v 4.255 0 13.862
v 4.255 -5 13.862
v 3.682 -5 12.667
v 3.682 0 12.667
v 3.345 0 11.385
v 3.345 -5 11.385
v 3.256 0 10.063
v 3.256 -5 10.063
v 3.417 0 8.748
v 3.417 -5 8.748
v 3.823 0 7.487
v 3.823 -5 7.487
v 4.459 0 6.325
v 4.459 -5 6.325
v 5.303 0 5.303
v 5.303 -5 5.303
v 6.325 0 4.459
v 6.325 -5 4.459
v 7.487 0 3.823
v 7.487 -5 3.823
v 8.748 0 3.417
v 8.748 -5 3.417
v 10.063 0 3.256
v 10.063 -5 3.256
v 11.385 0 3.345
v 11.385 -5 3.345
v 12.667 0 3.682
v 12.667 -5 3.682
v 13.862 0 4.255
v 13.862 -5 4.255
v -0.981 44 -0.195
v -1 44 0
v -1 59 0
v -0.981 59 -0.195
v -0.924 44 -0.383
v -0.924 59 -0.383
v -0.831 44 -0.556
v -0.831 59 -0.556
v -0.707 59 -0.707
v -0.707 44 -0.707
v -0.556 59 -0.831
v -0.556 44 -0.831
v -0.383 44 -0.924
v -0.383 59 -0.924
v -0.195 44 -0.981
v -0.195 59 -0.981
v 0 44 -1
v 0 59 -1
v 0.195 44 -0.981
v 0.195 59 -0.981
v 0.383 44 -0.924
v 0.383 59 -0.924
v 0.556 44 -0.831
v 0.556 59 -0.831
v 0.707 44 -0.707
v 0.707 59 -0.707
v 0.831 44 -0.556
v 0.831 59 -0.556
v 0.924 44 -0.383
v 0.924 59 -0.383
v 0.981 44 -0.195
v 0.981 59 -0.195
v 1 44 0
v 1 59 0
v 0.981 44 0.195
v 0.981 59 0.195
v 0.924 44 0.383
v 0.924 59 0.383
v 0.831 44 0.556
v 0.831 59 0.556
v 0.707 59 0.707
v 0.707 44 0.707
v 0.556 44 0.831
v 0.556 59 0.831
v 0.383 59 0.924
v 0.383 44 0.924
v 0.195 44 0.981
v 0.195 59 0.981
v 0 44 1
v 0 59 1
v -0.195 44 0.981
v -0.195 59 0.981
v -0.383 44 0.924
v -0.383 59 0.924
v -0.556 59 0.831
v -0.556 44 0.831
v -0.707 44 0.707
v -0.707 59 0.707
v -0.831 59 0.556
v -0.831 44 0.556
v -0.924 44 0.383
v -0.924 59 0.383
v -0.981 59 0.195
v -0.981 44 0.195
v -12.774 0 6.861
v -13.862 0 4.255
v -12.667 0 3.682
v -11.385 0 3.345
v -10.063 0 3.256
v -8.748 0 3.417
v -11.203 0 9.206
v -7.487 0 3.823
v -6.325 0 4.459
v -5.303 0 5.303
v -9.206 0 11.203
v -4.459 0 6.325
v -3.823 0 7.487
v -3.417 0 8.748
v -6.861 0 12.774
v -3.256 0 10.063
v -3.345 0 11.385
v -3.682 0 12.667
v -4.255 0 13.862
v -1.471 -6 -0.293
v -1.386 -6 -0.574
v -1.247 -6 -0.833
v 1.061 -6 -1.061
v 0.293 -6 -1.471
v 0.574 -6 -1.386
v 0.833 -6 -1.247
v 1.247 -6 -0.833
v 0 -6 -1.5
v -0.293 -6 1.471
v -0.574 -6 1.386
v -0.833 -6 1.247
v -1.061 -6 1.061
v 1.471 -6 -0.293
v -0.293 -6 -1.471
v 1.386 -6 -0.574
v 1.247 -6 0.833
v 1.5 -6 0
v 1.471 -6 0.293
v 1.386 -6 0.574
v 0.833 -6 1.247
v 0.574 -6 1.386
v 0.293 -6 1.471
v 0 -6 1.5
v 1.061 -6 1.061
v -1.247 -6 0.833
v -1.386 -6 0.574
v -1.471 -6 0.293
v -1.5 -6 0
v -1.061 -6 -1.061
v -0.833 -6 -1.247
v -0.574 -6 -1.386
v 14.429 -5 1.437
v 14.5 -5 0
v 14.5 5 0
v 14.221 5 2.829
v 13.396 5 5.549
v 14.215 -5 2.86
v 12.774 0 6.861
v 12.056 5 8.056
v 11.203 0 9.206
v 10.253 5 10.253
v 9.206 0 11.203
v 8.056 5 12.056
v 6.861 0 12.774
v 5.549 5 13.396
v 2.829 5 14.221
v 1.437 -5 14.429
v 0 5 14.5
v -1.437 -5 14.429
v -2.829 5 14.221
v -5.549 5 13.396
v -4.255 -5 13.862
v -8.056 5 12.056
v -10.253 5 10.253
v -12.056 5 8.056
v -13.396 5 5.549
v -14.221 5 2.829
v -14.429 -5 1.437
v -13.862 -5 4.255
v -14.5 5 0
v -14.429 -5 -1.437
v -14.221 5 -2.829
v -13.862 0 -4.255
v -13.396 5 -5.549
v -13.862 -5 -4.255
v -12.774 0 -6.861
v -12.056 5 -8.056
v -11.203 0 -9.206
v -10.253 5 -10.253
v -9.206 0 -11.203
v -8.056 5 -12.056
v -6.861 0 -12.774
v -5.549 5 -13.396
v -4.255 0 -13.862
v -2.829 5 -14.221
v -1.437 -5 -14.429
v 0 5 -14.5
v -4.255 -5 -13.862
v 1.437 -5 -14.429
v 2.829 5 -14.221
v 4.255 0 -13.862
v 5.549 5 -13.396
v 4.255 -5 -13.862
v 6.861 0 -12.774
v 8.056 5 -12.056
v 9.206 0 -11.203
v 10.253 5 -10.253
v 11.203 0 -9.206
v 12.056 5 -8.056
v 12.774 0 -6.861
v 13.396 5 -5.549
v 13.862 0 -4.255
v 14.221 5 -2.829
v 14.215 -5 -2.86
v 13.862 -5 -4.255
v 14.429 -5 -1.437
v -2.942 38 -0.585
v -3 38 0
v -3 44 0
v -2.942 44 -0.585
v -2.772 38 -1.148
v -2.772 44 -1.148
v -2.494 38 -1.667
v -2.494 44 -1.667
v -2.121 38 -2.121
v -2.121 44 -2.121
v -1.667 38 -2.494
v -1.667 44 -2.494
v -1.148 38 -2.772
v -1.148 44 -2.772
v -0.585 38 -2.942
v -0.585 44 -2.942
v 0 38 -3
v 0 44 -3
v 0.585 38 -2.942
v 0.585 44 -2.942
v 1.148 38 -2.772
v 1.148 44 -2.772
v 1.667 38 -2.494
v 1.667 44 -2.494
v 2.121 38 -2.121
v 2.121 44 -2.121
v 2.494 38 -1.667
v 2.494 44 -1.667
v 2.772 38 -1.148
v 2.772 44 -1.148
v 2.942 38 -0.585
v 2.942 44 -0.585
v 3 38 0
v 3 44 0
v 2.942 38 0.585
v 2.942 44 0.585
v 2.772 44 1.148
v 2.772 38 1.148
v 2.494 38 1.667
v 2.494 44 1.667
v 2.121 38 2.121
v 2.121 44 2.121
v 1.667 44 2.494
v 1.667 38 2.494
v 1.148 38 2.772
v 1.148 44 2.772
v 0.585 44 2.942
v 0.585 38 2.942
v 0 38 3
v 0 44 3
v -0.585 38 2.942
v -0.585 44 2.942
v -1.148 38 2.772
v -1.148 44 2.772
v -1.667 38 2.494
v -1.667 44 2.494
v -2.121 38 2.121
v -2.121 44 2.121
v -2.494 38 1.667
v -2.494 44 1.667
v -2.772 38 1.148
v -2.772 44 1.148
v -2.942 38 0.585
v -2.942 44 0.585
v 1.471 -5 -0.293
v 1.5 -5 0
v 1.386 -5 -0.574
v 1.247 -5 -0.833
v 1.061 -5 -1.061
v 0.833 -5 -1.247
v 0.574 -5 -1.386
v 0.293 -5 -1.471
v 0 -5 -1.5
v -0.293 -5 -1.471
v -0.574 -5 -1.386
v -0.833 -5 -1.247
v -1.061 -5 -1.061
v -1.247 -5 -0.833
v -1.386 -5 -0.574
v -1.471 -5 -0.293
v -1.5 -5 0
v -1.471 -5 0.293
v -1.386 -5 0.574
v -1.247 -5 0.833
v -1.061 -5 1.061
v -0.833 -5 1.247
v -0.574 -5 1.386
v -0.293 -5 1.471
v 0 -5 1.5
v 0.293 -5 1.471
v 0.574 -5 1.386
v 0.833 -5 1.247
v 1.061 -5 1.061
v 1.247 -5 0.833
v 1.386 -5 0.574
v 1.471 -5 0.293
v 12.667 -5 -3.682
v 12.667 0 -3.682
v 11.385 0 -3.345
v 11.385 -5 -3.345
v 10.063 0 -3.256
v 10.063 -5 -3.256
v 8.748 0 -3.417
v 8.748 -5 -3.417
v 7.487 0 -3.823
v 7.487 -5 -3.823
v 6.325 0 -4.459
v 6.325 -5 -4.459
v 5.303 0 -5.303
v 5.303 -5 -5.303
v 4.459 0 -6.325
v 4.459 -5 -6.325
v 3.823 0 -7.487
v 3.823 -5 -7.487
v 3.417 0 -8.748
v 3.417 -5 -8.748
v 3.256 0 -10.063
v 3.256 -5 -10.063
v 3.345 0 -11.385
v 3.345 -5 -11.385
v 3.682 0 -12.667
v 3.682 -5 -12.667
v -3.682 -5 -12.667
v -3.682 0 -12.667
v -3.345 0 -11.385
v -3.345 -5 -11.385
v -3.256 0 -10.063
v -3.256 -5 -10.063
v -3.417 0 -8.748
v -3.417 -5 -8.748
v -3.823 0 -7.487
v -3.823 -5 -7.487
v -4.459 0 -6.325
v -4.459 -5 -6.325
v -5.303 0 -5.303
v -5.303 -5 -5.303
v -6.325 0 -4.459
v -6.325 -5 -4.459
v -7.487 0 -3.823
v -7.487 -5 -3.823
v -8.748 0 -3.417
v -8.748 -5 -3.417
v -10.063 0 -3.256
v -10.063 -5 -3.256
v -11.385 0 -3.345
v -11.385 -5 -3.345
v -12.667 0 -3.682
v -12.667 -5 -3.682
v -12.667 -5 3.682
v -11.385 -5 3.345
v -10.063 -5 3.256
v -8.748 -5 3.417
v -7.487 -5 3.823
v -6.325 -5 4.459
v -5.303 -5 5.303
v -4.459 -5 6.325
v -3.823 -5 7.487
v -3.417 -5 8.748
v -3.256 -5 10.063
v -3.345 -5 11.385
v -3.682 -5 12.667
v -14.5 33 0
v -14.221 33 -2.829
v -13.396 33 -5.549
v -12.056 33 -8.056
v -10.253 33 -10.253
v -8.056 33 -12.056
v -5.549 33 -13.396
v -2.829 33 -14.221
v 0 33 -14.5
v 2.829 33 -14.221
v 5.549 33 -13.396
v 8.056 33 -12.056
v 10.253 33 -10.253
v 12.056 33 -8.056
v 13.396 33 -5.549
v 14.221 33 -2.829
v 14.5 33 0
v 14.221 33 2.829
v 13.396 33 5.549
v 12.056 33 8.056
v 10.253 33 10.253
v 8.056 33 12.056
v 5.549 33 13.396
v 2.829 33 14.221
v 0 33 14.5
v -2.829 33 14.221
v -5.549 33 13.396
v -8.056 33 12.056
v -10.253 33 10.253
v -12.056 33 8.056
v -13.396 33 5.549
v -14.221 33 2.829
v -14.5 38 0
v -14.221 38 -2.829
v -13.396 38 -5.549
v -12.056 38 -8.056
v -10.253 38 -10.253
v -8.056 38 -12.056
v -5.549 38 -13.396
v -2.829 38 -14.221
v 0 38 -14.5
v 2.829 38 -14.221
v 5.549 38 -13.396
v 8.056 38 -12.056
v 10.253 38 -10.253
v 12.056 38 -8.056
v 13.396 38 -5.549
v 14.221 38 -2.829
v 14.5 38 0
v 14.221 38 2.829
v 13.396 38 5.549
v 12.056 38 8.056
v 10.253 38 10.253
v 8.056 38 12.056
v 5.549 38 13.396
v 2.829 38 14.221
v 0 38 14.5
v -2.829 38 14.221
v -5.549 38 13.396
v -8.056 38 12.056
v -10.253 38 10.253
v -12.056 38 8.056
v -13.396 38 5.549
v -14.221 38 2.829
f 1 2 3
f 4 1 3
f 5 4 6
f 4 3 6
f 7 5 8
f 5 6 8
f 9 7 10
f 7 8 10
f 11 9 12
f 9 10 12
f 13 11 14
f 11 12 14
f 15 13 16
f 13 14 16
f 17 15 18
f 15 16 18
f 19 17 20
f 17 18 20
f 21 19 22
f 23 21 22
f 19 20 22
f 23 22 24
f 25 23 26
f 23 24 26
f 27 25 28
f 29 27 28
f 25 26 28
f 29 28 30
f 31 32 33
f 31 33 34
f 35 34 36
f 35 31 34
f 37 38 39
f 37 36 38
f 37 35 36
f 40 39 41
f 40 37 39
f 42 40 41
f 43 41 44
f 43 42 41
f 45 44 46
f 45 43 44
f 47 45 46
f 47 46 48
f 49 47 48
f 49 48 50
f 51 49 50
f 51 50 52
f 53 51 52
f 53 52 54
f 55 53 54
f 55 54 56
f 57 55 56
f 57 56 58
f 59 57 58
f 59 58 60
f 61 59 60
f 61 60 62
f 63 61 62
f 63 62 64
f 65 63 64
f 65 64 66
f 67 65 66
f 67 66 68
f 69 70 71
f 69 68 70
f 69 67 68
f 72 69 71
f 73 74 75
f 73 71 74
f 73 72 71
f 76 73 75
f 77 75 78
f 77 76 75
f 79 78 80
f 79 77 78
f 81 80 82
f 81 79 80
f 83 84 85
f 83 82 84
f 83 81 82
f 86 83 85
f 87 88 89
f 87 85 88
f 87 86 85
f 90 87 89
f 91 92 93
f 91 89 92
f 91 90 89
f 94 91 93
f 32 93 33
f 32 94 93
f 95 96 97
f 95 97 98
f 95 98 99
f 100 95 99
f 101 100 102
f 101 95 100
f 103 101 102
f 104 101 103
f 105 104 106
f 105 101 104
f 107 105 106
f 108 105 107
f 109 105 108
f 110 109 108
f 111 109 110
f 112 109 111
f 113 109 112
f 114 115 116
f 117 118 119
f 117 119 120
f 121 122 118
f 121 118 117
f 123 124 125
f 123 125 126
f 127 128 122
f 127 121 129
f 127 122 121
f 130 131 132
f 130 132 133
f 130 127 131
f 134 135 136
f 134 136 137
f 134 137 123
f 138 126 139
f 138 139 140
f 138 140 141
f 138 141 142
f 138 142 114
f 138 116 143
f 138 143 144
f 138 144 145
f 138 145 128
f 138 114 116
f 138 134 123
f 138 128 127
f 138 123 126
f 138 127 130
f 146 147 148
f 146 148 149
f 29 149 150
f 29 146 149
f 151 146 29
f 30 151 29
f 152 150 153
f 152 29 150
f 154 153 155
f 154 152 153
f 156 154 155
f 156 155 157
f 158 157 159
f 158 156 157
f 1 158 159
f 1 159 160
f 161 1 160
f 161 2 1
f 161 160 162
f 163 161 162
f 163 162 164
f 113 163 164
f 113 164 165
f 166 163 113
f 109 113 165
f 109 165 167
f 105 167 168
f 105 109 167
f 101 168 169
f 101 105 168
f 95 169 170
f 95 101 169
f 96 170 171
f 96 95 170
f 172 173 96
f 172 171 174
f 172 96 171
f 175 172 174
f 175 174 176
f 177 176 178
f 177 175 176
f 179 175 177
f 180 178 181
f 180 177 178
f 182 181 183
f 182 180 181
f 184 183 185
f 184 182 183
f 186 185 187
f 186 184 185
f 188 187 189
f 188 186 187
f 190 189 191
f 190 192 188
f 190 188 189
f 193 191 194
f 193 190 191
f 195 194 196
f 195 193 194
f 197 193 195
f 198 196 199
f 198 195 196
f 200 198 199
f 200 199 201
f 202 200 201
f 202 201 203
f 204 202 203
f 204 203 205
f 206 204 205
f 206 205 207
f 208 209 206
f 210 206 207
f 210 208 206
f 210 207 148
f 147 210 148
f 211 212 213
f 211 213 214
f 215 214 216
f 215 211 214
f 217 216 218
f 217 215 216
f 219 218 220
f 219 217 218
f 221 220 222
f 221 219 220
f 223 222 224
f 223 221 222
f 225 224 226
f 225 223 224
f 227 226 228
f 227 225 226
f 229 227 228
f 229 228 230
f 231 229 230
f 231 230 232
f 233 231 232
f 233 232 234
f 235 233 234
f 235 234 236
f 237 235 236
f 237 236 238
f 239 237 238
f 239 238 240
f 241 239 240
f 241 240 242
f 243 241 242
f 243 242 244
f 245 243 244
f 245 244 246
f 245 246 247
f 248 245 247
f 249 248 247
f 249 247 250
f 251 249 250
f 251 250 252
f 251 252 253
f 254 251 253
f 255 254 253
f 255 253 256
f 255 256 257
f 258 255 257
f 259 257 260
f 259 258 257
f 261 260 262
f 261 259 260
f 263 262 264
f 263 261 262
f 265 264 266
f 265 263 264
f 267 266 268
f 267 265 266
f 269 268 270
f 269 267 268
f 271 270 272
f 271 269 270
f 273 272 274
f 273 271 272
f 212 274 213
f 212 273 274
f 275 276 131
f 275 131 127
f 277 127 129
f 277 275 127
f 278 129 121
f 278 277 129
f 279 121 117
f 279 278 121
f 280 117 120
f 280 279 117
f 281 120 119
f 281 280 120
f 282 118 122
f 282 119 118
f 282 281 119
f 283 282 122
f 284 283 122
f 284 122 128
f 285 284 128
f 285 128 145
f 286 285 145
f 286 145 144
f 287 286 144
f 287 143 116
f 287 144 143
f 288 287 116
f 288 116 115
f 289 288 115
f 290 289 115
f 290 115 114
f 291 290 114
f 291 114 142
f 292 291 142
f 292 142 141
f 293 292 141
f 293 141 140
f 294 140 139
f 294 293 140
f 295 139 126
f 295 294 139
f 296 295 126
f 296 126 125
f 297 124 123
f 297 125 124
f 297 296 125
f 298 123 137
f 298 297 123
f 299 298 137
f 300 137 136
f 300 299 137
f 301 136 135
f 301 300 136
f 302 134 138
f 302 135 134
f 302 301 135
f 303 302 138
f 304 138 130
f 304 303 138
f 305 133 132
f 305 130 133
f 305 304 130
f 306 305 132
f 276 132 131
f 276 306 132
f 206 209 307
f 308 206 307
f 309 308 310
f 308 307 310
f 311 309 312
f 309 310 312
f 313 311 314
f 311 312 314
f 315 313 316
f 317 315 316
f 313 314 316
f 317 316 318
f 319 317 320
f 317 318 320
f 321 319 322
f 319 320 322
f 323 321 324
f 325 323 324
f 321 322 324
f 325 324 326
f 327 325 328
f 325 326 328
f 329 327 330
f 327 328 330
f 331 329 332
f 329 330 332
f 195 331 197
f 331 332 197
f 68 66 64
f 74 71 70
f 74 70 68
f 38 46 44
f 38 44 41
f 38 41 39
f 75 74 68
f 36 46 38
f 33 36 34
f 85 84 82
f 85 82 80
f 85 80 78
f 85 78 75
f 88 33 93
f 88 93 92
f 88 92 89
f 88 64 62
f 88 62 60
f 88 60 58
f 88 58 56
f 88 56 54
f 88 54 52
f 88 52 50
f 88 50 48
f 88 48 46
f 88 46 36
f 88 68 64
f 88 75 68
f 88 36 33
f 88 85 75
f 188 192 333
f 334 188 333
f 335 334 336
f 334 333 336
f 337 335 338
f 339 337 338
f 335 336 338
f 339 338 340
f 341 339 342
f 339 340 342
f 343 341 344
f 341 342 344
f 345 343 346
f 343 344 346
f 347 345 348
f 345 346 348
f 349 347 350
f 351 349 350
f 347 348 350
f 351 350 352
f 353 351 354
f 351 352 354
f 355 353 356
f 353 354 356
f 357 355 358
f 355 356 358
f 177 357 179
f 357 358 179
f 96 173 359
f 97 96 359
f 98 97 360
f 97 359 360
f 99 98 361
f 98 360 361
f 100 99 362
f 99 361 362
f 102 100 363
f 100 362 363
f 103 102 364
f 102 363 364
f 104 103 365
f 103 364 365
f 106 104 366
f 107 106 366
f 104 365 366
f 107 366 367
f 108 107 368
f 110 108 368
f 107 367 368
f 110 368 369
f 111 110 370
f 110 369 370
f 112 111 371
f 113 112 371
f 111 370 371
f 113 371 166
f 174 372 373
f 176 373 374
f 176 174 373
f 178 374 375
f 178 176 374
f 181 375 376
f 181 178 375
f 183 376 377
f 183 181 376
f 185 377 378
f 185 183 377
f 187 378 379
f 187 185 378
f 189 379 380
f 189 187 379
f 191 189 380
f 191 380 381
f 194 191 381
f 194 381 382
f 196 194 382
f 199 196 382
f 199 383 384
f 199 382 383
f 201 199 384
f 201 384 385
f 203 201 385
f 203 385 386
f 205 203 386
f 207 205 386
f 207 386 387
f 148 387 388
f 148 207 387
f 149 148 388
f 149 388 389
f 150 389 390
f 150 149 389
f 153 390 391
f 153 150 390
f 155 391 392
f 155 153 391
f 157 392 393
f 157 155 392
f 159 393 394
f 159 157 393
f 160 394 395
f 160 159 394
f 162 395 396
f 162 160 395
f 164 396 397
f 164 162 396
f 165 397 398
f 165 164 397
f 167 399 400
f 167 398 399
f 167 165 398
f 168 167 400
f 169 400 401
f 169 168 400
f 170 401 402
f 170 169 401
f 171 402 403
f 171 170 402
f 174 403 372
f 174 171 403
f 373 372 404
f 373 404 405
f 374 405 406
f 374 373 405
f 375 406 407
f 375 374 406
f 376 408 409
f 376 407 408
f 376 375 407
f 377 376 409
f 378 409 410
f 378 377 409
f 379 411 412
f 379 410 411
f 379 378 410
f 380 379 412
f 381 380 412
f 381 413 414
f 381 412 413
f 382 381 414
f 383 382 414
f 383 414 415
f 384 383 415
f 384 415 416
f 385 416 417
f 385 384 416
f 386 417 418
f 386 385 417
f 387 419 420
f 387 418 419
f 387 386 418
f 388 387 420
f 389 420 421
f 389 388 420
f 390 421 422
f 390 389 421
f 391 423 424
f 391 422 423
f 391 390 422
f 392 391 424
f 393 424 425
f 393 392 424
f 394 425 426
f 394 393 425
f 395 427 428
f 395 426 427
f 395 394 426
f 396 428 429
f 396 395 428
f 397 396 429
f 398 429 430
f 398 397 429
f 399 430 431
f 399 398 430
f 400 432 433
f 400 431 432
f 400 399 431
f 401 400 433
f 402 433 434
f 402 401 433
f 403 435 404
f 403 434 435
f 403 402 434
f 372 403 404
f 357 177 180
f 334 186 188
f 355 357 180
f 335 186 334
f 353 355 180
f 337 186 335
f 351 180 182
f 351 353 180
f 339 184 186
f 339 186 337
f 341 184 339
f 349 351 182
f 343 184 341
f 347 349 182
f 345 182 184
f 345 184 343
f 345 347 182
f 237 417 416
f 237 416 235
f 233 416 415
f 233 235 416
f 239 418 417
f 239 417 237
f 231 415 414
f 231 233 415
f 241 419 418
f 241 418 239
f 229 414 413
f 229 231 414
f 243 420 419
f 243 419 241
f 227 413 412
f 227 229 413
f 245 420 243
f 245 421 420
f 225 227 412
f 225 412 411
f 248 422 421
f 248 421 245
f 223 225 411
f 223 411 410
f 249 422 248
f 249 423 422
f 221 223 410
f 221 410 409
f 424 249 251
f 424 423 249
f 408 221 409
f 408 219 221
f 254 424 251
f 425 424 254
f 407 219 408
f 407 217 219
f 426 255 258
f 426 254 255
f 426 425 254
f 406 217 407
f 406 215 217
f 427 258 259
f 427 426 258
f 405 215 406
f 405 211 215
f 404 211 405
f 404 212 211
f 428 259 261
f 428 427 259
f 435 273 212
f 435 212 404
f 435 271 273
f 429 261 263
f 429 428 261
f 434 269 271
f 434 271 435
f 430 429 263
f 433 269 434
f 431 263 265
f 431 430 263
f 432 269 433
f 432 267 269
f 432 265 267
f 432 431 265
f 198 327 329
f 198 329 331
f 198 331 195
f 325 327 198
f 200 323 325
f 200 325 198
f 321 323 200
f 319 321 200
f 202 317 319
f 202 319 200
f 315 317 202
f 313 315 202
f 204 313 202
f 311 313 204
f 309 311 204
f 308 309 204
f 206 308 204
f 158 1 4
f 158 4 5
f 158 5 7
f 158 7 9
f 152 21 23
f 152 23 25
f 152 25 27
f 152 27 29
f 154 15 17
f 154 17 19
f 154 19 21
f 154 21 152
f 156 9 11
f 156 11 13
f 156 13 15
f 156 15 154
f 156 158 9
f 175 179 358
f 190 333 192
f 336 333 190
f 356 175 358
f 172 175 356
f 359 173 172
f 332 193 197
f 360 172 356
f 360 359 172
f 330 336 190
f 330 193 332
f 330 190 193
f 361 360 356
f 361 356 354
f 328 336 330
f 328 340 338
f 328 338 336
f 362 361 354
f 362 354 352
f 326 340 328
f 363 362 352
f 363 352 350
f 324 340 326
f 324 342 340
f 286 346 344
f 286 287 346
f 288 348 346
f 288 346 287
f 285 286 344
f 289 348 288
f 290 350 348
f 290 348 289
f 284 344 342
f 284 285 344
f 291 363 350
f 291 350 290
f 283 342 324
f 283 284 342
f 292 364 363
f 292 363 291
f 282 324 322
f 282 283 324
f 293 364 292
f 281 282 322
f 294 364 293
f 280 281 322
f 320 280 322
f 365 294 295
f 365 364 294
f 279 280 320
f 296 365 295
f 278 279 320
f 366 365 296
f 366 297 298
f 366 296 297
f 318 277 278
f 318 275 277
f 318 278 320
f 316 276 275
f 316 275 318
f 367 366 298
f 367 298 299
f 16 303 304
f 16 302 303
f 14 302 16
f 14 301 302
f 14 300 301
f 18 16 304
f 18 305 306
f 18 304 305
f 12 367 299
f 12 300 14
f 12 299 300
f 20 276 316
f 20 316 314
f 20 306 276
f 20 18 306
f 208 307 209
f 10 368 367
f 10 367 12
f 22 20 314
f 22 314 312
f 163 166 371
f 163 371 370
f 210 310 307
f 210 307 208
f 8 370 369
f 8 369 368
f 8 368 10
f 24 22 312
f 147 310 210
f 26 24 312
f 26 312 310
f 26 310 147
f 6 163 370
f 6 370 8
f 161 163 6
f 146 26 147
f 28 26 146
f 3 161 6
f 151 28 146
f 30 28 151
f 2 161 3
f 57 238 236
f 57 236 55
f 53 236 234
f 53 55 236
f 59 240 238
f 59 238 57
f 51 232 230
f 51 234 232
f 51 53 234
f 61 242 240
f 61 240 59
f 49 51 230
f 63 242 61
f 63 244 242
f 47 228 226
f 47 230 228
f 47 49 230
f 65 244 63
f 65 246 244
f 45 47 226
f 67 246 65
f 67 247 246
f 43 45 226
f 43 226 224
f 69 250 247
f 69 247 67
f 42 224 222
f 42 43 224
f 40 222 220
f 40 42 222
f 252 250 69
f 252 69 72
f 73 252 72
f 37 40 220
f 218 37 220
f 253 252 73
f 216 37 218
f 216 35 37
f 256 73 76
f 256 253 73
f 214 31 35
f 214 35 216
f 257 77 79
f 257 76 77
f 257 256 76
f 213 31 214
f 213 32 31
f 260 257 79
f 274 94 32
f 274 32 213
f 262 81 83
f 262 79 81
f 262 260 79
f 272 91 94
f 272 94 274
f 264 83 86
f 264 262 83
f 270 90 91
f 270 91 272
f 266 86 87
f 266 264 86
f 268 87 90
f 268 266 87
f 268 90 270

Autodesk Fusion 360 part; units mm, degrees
sketch "Sketch1" plane through (0, 0, 0) normal (0, 1, 0) x (1, 0, 0)
  circle A0 centre (0, 0) radius 14.5
  dimension "d1" = 29
extrude "Extrude1" add sketch "Sketch1" along normal blind 5
sketch "Sketch2" plane through (0, 0, 0) normal (0, -1, 0) x (1, 0, 0)
  circle A0 centre (0, 0) radius 14.5
  circle A1 centre (0, 0) radius 1.5
  circle A2 centre (0, 0) radius 14.5
  dimension "d4" = 3
extrude "Extrude2" add sketch "Sketch2" along normal blind 5 contours A0 A2 | A1
sketch "Sketch3" plane through (0, -5, 0) normal (0, -1, 0) x (1, 0, 0)
  circle A0 centre (0, 0) radius 14.5
  line L0 (0, 0) -> (10.253, 10.253)
  line L1 (0, 0) -> (14.5, 0) construction
  line L2 (0, 0) -> (10.253, -10.253)
  line L3 (0, 0) -> (-10.253, -10.253)
  line L4 (0, 0) -> (-10.253, 10.253)
  circle A1 centre (-10.253, -10.253) radius 7
  circle A2 centre (10.253, -10.253) radius 7
  circle A3 centre (10.253, 10.253) radius 7
  circle A4 centre (-10.253, 10.253) radius 7
  dimension "d7" = 45
  dimension "d8" = 14
  dimension "d9" = 14
  dimension "d10" = 14
  dimension "d11" = 14
extrude "Extrude3" cut sketch "Sketch3" against normal blind 5 contours A0 L0 A3 | A0 L2 A2 | A0 L0 A3 | A0 L2 A2 | A0 L4 A4 | A0 L3 A1 | A0 L3 A1 | A0 L4 A4
sketch "Sketch4" plane through (0, -5, 0) normal (0, -1, 0) x (1, 0, 0)
  arc A0 (-4.2549, -13.8617) -> (-13.8617, -4.2549) centre (-10.253, -10.253) ccw
  arc A1 (-4.2549, -13.8617) -> (4.2549, -13.8617) centre (0, 0) ccw
  arc A2 (13.8617, -4.2549) -> (4.2549, -13.8617) centre (10.253, -10.253) ccw
  arc A3 (13.8617, -4.2549) -> (13.8617, 4.2549) centre (0, 0) ccw
  arc A4 (4.2549, 13.8617) -> (13.8617, 4.2549) centre (10.253, 10.253) ccw
  arc A5 (4.2549, 13.8617) -> (-4.2549, 13.8617) centre (0, 0) ccw
  arc A6 (-13.8617, 4.2549) -> (-4.2549, 13.8617) centre (-10.253, 10.253) ccw
  arc A7 (-13.8617, 4.2549) -> (-13.8617, -4.2549) centre (0, 0) ccw
  circle A8 centre (0, 0) radius 1.5
  dimension "d14" = 3
extrude "Extrude4" add sketch "Sketch4" along normal blind 1 contours A8
sketch "Sketch5" plane through (0, 5, 0) normal (0, 1, 0) x (-1, 0, 0)
  circle A0 centre (0, 0) radius 14.5
  circle A1 centre (0, 0) radius 14.5
extrude "Extrude5" add sketch "Sketch5" along normal blind 28
sketch "Sketch6" plane through (0, 33, 0) normal (0, 1, 0) x (-1, 0, 0)
  circle A0 centre (0, 0) radius 14.5
  circle A1 centre (0, 0) radius 14.5
extrude "Extrude6" add sketch "Sketch6" along normal blind 5
sketch "Sketch7" plane through (0, 38, 0) normal (0, 1, 0) x (-1, 0, 0)
  circle A0 centre (0, 0) radius 14.5
  line L0 (0, 0) -> (10.253, -10.253)
  line L1 (0, 0) -> (14.5, 0) construction
  line L2 (0, 0) -> (-10.253, -10.253)
  line L3 (0, 0) -> (14.5, 0) construction
  line L4 (0, 0) -> (-10.253, 10.253)
  line L5 (-10.253, 10.253) -> (-6.7175, 6.7175)
  line L6 (-10.253, -10.253) -> (-6.7175, -6.7175)
  line L7 (10.253, -10.253) -> (6.7175, -6.7175)
  line L8 (10.253, 10.253) -> (8.8388, 8.8388)
  circle A1 centre (0, 0) radius 3.5
  circle A2 centre (0, 0) radius 12.5
  circle A3 centre (0, 0) radius 3
  dimension "d21" = 45
  dimension "d22" = 14.5
  dimension "d23" = 135
  dimension "d25" = 5
  dimension "d26" = 5
  dimension "d27" = 5
  dimension "d28" = 2
  dimension "d29" = 7
  dimension "d30" = 6
extrude "Extrude7" add sketch "Sketch7" along normal blind 6 contours L0 L2 A3 | L0 L4 A3 | L2 L4 A3
sketch "Sketch8" plane through (0, 44, 0) normal (0, 1, 0) x (-1, 0, 0)
  circle A0 centre (0, 0) radius 3
  circle A1 centre (0, 0) radius 1
  dimension "d33" = 2
extrude "Extrude8" add sketch "Sketch8" along normal blind 15 contours A1
equation "d8 = 0.7 cm * 2"
equation "d23 = 90 deg + 45 deg"
